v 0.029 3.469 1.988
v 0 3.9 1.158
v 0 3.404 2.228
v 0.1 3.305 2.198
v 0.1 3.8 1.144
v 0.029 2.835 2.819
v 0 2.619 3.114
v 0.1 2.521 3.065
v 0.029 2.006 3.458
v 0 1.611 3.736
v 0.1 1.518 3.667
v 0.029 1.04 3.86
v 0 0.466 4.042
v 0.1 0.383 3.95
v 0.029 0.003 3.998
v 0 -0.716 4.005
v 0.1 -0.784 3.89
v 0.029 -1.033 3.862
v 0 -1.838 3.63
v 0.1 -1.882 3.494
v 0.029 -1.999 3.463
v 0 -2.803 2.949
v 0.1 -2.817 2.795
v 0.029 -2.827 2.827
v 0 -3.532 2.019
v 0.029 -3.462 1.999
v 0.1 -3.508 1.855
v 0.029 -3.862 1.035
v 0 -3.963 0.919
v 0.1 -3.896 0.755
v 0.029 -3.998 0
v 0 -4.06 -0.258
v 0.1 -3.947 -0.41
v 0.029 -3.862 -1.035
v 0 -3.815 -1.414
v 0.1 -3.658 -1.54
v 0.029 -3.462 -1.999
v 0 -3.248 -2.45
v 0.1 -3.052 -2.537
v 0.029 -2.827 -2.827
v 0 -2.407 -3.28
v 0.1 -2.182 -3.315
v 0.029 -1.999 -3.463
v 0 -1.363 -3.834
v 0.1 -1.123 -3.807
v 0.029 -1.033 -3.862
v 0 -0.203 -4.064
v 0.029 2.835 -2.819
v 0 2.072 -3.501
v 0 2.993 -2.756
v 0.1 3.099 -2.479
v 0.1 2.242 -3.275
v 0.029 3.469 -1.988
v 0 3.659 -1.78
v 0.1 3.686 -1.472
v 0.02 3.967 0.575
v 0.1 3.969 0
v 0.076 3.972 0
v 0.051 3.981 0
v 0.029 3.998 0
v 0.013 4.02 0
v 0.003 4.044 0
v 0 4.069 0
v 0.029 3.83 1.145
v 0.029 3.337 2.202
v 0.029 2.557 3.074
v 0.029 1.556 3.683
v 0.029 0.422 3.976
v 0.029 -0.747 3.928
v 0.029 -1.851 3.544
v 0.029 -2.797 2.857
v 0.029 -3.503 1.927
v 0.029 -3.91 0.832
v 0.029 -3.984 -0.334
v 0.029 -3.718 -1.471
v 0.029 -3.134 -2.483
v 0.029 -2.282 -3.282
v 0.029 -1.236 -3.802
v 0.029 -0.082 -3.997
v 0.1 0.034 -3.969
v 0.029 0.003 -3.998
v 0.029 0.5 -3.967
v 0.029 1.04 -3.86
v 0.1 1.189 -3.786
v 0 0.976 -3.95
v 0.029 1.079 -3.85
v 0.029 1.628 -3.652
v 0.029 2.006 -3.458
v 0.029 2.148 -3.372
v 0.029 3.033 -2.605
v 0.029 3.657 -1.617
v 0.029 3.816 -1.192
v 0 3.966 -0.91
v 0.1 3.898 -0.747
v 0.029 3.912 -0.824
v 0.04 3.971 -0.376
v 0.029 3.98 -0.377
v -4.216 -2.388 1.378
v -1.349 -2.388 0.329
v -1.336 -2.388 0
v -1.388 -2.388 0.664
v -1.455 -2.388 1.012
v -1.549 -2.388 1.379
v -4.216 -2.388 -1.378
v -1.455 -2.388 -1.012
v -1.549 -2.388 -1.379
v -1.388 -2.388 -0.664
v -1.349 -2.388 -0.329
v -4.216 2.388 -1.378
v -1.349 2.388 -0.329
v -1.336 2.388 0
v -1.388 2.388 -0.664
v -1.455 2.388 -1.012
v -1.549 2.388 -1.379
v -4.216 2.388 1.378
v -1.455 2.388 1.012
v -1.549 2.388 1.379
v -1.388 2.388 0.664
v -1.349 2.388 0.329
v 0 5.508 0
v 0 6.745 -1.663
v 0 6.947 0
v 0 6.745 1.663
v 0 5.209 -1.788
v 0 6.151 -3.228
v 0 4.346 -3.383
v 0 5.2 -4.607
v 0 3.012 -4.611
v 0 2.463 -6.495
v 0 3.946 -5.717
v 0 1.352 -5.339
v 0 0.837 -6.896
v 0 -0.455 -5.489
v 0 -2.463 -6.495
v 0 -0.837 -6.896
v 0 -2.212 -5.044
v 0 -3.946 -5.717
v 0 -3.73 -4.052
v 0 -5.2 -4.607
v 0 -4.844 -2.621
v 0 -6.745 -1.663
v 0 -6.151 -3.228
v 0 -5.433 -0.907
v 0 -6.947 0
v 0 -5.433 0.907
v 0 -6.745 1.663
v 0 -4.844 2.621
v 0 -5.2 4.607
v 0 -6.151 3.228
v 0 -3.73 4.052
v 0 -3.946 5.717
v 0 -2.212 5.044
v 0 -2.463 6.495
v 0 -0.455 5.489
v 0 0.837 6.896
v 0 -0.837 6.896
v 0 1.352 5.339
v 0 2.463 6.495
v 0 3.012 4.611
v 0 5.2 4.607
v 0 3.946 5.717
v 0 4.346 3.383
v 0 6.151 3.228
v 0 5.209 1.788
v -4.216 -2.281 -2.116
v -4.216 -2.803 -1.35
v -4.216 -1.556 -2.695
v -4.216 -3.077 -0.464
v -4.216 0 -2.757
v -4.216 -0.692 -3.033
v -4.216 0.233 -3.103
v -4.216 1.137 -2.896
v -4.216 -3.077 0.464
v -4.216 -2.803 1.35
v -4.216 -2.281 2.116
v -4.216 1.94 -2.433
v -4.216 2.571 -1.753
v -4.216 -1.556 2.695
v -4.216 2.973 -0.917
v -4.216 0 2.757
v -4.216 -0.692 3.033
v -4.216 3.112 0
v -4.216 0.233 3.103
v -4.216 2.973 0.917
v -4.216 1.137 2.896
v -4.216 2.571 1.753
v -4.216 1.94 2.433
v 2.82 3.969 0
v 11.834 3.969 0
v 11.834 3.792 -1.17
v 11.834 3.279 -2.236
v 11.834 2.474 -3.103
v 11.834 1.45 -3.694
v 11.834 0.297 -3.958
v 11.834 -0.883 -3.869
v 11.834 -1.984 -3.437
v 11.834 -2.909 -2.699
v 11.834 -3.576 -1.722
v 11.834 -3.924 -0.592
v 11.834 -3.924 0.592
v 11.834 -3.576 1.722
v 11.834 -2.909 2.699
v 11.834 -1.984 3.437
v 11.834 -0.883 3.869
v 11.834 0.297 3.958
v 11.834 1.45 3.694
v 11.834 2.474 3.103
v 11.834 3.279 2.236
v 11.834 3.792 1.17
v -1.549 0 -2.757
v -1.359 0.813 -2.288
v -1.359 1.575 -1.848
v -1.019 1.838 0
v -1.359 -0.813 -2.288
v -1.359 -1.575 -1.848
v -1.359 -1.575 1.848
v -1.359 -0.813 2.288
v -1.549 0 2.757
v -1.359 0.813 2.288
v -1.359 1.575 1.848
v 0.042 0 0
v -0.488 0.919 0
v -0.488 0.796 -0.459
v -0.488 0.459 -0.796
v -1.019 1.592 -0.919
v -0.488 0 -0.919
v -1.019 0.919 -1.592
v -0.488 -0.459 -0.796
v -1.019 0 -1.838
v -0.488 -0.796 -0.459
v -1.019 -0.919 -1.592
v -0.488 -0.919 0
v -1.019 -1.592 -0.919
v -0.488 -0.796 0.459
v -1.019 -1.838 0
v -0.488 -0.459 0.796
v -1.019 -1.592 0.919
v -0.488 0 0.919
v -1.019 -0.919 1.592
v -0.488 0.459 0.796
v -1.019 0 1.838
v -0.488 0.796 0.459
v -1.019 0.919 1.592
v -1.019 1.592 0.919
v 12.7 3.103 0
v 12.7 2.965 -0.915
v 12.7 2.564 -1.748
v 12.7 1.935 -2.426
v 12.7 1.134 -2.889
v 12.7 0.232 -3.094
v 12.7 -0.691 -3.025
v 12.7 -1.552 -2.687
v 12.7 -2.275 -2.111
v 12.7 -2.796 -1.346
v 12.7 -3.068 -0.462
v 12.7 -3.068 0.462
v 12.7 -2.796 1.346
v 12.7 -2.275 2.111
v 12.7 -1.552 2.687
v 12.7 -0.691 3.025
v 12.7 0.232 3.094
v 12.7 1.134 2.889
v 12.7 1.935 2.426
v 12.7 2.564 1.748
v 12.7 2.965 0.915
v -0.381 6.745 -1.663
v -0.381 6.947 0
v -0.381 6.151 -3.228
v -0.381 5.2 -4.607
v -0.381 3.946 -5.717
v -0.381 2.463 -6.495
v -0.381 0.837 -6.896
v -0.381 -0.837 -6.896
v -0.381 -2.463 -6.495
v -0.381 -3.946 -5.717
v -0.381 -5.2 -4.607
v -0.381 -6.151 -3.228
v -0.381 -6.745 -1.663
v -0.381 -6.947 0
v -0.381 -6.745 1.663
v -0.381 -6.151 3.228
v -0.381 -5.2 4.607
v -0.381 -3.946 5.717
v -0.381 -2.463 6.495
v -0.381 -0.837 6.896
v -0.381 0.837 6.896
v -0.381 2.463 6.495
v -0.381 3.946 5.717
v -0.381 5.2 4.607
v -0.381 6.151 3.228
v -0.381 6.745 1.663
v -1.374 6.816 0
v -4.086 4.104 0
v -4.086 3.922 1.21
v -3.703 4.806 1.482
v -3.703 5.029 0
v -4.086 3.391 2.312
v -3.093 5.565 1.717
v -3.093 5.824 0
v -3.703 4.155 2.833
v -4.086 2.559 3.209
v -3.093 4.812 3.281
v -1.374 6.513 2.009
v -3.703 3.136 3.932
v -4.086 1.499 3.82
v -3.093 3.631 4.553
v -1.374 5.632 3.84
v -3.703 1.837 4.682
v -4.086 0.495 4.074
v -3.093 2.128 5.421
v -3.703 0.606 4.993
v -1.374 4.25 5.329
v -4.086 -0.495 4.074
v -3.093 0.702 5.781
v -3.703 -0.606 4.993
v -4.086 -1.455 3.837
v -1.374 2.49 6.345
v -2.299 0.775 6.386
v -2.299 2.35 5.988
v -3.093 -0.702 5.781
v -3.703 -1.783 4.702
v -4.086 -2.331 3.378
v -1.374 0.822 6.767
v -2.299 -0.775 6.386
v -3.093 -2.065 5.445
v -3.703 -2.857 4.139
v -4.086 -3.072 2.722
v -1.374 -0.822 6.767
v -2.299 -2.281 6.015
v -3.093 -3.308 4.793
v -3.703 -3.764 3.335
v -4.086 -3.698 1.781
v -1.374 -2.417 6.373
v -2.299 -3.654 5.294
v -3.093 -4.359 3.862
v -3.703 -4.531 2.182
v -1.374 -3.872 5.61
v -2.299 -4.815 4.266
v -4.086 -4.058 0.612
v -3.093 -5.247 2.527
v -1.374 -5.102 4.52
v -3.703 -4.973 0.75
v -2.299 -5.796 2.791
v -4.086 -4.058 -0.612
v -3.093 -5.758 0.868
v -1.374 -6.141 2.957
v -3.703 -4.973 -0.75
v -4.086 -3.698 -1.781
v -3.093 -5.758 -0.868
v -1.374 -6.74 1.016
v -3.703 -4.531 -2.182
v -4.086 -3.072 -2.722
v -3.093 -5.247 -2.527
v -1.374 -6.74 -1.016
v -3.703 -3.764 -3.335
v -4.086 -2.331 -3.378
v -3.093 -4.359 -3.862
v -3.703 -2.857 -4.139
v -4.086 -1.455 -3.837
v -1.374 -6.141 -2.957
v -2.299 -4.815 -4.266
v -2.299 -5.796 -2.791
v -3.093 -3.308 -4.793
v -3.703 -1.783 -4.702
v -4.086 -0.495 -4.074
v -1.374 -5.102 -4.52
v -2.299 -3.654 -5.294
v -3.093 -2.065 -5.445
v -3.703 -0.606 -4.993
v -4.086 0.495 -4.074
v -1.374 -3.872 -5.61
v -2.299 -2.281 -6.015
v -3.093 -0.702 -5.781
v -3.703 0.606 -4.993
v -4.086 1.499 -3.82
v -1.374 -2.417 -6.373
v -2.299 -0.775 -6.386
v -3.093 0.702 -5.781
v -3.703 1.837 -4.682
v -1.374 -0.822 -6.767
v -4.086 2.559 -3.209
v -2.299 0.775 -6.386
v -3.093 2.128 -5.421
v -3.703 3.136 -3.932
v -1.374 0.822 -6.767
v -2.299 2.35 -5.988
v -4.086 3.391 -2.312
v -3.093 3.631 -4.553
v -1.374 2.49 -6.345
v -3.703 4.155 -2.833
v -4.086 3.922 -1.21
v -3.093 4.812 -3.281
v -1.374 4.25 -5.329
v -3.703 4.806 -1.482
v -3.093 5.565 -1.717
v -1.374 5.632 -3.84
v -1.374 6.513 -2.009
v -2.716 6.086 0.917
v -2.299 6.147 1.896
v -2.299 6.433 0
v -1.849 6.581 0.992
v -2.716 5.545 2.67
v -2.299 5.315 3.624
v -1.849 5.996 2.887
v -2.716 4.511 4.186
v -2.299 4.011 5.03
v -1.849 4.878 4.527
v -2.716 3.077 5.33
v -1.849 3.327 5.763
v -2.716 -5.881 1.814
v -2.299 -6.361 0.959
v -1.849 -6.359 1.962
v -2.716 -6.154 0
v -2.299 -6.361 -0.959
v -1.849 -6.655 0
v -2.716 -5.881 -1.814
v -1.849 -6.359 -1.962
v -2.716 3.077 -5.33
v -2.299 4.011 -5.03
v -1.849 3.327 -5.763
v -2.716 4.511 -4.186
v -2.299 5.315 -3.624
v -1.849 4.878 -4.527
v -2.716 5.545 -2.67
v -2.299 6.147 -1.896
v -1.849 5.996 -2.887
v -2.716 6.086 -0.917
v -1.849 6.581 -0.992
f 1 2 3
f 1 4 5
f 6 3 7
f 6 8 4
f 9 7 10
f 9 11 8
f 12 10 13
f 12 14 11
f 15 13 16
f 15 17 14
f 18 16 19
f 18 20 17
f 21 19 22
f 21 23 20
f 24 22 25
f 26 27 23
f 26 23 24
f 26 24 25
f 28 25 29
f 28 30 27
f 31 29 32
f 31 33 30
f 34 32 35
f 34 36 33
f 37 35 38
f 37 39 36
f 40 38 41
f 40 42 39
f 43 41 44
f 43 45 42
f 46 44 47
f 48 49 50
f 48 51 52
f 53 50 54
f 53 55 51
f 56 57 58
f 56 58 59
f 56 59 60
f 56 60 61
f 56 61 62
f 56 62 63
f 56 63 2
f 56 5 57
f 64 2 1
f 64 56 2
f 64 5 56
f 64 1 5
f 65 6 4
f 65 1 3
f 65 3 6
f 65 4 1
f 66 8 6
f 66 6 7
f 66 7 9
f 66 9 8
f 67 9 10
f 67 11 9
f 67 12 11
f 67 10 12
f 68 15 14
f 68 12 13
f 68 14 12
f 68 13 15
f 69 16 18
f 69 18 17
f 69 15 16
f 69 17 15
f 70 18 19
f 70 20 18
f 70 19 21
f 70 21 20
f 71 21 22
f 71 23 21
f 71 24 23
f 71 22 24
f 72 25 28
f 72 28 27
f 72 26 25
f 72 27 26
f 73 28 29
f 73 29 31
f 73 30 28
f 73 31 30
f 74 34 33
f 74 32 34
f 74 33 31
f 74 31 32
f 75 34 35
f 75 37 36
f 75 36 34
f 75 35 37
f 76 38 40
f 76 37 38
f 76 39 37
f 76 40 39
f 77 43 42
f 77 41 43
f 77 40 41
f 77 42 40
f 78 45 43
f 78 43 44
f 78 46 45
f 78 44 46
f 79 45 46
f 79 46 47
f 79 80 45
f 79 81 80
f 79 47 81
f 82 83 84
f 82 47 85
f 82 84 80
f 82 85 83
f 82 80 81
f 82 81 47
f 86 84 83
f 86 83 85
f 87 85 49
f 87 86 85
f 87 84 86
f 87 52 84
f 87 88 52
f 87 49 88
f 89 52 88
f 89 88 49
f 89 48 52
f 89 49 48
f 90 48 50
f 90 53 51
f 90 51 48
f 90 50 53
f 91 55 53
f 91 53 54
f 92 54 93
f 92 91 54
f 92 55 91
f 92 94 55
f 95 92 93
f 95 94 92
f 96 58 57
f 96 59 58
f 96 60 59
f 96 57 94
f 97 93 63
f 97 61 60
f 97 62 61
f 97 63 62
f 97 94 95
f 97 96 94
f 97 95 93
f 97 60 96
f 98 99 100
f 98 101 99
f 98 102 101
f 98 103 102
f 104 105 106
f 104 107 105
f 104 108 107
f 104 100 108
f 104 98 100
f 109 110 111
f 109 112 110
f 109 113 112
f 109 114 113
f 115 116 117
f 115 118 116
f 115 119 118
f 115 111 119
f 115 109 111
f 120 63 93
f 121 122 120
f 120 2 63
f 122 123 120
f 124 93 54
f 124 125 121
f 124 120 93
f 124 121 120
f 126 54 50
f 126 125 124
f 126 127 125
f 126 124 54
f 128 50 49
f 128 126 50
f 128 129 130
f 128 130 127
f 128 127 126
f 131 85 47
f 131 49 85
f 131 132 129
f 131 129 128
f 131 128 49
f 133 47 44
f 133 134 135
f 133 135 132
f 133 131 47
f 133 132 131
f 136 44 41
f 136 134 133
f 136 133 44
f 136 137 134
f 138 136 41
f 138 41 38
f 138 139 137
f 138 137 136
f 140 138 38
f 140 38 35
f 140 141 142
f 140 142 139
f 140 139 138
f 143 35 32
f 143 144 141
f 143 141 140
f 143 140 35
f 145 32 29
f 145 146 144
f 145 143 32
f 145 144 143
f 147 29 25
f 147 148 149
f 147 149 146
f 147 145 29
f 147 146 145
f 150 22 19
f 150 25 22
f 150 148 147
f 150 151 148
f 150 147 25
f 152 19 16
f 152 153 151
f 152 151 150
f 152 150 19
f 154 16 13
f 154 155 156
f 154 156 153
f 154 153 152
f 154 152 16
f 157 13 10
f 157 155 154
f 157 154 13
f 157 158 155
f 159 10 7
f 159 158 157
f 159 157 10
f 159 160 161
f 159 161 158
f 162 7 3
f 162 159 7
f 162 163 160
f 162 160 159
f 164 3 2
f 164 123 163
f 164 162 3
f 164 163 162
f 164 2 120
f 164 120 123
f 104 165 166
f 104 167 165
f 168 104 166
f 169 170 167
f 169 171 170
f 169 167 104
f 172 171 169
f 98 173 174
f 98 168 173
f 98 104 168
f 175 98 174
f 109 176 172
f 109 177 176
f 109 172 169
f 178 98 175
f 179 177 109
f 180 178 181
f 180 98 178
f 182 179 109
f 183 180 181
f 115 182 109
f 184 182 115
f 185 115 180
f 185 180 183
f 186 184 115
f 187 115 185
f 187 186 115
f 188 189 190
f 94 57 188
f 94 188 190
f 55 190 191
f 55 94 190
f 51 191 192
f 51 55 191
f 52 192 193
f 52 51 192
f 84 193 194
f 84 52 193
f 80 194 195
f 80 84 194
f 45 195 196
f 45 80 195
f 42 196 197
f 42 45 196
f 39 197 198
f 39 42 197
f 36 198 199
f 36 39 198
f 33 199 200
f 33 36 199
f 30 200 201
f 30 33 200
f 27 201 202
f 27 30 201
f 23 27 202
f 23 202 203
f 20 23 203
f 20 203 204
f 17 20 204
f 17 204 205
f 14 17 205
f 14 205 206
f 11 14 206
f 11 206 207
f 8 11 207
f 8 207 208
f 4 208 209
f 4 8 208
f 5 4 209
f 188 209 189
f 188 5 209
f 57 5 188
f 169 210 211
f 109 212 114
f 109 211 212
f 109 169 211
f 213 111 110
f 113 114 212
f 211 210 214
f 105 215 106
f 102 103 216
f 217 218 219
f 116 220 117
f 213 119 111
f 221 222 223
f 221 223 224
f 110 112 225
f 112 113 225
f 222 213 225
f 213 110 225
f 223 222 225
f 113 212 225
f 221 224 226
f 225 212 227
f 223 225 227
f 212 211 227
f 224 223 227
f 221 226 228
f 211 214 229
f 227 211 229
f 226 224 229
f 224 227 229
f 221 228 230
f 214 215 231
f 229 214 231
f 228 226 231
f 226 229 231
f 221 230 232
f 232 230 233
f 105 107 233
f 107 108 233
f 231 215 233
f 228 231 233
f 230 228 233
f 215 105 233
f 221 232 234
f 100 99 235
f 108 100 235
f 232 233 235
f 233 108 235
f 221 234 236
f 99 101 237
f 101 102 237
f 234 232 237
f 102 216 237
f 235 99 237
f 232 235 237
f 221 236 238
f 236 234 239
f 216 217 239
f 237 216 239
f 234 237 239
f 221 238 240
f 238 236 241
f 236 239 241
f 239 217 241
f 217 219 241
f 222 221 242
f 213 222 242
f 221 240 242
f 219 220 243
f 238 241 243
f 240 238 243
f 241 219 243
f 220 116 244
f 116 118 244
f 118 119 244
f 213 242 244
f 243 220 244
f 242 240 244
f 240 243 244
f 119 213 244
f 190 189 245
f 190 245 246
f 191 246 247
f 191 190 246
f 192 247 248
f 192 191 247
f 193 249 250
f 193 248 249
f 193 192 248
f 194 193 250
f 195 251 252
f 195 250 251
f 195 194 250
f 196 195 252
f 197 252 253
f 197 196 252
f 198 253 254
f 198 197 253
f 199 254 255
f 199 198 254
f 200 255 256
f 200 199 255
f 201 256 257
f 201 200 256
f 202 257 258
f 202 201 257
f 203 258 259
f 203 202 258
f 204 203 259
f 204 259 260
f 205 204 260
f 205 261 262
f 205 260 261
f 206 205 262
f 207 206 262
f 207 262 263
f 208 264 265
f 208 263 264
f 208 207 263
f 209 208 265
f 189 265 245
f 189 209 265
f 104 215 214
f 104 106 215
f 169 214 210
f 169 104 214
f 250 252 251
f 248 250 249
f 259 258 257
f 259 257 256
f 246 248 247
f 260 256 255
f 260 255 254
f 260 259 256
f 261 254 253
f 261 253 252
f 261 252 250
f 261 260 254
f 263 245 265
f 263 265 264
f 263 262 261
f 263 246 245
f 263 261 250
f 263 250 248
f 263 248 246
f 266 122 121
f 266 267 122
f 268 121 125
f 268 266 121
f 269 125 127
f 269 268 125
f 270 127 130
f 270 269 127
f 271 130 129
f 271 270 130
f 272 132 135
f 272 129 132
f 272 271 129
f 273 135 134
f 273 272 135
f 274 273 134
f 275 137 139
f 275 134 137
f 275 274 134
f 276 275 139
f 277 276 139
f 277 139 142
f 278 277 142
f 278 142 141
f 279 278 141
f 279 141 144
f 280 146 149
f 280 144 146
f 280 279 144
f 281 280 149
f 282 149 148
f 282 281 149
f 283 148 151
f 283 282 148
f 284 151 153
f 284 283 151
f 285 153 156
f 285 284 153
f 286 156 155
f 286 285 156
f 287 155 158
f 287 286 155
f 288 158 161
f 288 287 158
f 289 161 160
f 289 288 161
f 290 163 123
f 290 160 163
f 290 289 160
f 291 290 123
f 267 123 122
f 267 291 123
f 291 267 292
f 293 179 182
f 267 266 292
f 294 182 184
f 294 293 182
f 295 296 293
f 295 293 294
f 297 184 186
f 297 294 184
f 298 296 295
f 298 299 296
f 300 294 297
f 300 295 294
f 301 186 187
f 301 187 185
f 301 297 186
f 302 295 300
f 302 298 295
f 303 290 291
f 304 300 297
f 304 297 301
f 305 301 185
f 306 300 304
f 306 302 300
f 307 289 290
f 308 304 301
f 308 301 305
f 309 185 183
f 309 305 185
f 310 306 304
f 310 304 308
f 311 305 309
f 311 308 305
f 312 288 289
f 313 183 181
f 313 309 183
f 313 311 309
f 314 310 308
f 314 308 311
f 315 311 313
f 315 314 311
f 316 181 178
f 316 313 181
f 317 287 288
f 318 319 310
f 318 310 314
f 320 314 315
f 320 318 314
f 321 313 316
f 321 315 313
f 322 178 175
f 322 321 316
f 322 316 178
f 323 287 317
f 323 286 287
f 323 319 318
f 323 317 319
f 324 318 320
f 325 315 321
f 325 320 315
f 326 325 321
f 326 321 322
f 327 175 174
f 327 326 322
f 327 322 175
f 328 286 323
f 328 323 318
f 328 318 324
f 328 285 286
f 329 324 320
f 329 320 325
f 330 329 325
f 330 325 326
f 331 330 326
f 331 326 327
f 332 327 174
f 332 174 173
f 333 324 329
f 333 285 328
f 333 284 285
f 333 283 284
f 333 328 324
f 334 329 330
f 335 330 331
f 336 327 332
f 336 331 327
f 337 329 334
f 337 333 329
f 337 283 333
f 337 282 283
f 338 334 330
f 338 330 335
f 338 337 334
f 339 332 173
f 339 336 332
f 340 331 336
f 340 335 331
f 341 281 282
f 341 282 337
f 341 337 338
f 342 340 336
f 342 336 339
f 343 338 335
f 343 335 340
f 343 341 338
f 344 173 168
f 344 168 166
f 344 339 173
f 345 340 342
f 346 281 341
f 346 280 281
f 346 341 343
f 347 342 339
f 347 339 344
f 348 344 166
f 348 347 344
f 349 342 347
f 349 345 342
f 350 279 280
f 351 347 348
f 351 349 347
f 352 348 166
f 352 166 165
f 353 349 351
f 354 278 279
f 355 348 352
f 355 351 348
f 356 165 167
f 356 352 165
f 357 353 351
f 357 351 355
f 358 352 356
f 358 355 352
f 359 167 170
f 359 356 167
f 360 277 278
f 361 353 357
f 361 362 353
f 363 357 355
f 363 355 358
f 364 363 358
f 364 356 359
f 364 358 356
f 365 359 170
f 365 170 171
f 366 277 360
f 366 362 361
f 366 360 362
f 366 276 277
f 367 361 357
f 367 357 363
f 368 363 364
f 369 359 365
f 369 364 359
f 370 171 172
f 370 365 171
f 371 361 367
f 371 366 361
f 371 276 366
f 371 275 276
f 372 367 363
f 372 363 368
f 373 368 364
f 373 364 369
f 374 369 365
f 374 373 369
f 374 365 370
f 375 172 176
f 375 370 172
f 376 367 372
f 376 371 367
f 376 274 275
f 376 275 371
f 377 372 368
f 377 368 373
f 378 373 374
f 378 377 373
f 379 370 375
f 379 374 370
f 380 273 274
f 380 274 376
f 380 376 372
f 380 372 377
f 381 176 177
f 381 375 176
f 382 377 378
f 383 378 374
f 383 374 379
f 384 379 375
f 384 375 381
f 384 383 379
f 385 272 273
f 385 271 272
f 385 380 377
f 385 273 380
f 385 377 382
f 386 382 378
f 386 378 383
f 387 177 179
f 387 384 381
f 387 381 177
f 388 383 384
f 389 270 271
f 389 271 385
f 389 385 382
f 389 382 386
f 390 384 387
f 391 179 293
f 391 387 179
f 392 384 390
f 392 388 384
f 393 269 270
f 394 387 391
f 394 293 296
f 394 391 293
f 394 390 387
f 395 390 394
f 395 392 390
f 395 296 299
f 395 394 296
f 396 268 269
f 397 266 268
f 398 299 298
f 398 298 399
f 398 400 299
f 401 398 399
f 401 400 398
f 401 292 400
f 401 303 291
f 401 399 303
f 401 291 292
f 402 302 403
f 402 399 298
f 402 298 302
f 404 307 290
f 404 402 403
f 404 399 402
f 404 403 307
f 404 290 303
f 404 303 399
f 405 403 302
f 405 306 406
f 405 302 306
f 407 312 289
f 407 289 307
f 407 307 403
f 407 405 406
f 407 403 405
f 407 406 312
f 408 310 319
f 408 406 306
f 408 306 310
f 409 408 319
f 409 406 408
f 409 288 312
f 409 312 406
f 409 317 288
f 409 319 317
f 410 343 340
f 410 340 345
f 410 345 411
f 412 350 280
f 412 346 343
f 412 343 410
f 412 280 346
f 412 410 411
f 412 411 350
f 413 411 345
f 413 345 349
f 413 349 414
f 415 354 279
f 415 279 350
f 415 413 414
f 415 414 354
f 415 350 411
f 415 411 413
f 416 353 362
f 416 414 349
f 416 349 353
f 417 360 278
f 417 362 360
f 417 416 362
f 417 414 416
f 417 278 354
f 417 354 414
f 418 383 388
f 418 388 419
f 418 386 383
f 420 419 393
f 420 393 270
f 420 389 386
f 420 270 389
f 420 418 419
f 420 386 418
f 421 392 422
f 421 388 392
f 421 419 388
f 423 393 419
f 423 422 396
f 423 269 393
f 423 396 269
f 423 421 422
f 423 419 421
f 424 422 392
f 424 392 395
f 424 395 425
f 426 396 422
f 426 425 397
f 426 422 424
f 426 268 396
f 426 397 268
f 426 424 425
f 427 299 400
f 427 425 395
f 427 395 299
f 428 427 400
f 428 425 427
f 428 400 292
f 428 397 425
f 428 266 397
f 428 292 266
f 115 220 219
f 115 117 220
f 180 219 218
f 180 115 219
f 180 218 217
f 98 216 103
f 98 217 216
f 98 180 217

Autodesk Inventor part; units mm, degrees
ref_plane "YZ Plane" through (0, 0, 0) normal (1, 0, 0) x (0, 1, 0)
ref_plane "XZ Plane" through (0, 0, 0) normal (0, 1, 0) x (-1, 0, 0)
sketch "Sketch1" plane through (0, 0, 0) normal (0, 0, 1) x (1, 0, 0)
  line L0 (0.0423, 0) -> (12.7, 0)
  line L1 (12.7, 0) -> (12.7, 3.9687)
  line L2 (12.7, 3.9687) -> (2.8196, 3.9687)
  line L3 (2.8196, 3.9687) -> (0.0001, 3.9688)
  line L4 (0.0001, 3.9688) -> (0, 3.9688)
  line L5 (0, 3.9688) -> (0, 6.9469)
  line L6 (0, 6.9469) -> (-4.2164, 6.9469)
  line L7 (-4.2164, 6.9469) -> (-4.2164, 2.757)
  line L8 (-4.2164, 2.757) -> (-1.5494, 2.757)
  line L9 (-1.5494, 2.757) -> (0.0423, 0)
  line L10 (-7.5997, 0) -> (16.0833, 0) projected
  line L11 (0, -1.3894) -> (0, 8.3363) projected
  line L12 (2.8196, 3.9687) -> (0, 3.9687) construction
  dimension "d1" = 9.8804
  dimension "d2" = 2.8195
  dimension "d3" = 4.2164
  dimension "d4" = 2.667
  dimension "d5" = 60
  dimension "d6" = 7.9375
  dimension "d7" = 7.9375
  dimension "d8" = 5.5139
  dimension "d9" = 13.8938
  dimension "d26" = 12.7
revolve "Body" add sketch "Sketch1" angle 360 about axis through (0.0423, 0, 0) along (1, 0, 0) contours L9 L11 L3 L2 L1 L0 | L9 L8 L7 L6 L5 L11
sketch "Sketch2" plane through (-4.2164, 0, 0) normal (-1, 0, 0) x (0, 0, 1)
  circle A0 centre (0, 0) radius 2.757 projected
  line L0 (0, -9.7257) -> (0, 9.7257) projected
  line L1 (-9.7257, 0) -> (9.7257, 0) projected
  line L2 (2.757, 0) -> (1.3785, -2.3876)
  line L3 (1.3785, -2.3876) -> (-1.3785, -2.3876)
  line L4 (-1.3785, -2.3876) -> (-2.757, 0)
  line L5 (-2.757, 0) -> (-1.3785, 2.3876)
  line L6 (-1.3785, 2.3876) -> (1.3785, 2.3876)
  line L7 (1.3785, 2.3876) -> (2.757, 0)
extrude "Slot" add sketch "Sketch2" against normal up to next contours L7 A0 | A0 L2 | L6 L0 A0 | A0 L0 L3 | L0 L6 A0 | A0 L3 L0 | L4 A0 | A0 L5
fillet "Fillet1" radius 3.8354 1 edges at (-4.2164, -6.9469, 0)
thread "Thread" size "5/16-18 UNC" class "2A" standard "ANSI Unified Screw Threads" length 9.8804
chamfer "Chamfer1" distance 0.8656 distance2 0.8656 1 edges at (12.7, -3.9687, 0) measured on face at (12.7, -1.1714, -0.6148)
ref_plane "Work Plane1" through (29, 0, 0) normal (0, -1, 0) x (1, 0, 0)
fillet "Fillet2" radius 0.1 1 edges at (0.0001, -3.9688, 0)
equation "\"d1\" = GEL"
equation "\"d3\" = KOH"
equation "\"d4\" = INTI"
equation "\"d6\" = GD"
equation "\"d7\" = BDM"
equation "\"d8\" = 1.1547 * SW"
equation "\"d9\" = KOD"
equation "\"d26\" = NLG"
equation "\"d30\" = R"
equation "\"d17\" = RR"
equation "\"d13\" = GEL"
equation "\"d15\" = -0.5 * SPD + 0.5 * GD"
equation "\"d16\" = GUL"
equation "\"GD\" = NND"
equation "\"NLG\" = 12.7"
equation "\"GEL\" = 9.8804"
equation "\"KOD\" = 13.8938"
equation "\"KOH\" = 4.2164"
equation "\"INTI\" = 2.667"
equation "\"GAL\" = 2.8194"
equation "\"GUL\" = 0.86563"
equation "\"BDM\" = NND"
equation "\"SW\" = 4.7752"
equation "\"RR\" = 3.8354"
equation "\"SPD\" = 6.20624"
equation "\"R\" = 0.1"
equation "\"TOA\" = 30deg"
equation "\"GD1\" = SPD"
equation "\"THREADDIA\" = 7.9375"
equation "\"KOH1\" = 0.7874"
equation "\"NND\" = 7.9375"
equation "\"E0\" = 5.51536"
properties part number "ANSI B18.3 - 5/16 - 18 x 1/2" material "Steel, Mild"
